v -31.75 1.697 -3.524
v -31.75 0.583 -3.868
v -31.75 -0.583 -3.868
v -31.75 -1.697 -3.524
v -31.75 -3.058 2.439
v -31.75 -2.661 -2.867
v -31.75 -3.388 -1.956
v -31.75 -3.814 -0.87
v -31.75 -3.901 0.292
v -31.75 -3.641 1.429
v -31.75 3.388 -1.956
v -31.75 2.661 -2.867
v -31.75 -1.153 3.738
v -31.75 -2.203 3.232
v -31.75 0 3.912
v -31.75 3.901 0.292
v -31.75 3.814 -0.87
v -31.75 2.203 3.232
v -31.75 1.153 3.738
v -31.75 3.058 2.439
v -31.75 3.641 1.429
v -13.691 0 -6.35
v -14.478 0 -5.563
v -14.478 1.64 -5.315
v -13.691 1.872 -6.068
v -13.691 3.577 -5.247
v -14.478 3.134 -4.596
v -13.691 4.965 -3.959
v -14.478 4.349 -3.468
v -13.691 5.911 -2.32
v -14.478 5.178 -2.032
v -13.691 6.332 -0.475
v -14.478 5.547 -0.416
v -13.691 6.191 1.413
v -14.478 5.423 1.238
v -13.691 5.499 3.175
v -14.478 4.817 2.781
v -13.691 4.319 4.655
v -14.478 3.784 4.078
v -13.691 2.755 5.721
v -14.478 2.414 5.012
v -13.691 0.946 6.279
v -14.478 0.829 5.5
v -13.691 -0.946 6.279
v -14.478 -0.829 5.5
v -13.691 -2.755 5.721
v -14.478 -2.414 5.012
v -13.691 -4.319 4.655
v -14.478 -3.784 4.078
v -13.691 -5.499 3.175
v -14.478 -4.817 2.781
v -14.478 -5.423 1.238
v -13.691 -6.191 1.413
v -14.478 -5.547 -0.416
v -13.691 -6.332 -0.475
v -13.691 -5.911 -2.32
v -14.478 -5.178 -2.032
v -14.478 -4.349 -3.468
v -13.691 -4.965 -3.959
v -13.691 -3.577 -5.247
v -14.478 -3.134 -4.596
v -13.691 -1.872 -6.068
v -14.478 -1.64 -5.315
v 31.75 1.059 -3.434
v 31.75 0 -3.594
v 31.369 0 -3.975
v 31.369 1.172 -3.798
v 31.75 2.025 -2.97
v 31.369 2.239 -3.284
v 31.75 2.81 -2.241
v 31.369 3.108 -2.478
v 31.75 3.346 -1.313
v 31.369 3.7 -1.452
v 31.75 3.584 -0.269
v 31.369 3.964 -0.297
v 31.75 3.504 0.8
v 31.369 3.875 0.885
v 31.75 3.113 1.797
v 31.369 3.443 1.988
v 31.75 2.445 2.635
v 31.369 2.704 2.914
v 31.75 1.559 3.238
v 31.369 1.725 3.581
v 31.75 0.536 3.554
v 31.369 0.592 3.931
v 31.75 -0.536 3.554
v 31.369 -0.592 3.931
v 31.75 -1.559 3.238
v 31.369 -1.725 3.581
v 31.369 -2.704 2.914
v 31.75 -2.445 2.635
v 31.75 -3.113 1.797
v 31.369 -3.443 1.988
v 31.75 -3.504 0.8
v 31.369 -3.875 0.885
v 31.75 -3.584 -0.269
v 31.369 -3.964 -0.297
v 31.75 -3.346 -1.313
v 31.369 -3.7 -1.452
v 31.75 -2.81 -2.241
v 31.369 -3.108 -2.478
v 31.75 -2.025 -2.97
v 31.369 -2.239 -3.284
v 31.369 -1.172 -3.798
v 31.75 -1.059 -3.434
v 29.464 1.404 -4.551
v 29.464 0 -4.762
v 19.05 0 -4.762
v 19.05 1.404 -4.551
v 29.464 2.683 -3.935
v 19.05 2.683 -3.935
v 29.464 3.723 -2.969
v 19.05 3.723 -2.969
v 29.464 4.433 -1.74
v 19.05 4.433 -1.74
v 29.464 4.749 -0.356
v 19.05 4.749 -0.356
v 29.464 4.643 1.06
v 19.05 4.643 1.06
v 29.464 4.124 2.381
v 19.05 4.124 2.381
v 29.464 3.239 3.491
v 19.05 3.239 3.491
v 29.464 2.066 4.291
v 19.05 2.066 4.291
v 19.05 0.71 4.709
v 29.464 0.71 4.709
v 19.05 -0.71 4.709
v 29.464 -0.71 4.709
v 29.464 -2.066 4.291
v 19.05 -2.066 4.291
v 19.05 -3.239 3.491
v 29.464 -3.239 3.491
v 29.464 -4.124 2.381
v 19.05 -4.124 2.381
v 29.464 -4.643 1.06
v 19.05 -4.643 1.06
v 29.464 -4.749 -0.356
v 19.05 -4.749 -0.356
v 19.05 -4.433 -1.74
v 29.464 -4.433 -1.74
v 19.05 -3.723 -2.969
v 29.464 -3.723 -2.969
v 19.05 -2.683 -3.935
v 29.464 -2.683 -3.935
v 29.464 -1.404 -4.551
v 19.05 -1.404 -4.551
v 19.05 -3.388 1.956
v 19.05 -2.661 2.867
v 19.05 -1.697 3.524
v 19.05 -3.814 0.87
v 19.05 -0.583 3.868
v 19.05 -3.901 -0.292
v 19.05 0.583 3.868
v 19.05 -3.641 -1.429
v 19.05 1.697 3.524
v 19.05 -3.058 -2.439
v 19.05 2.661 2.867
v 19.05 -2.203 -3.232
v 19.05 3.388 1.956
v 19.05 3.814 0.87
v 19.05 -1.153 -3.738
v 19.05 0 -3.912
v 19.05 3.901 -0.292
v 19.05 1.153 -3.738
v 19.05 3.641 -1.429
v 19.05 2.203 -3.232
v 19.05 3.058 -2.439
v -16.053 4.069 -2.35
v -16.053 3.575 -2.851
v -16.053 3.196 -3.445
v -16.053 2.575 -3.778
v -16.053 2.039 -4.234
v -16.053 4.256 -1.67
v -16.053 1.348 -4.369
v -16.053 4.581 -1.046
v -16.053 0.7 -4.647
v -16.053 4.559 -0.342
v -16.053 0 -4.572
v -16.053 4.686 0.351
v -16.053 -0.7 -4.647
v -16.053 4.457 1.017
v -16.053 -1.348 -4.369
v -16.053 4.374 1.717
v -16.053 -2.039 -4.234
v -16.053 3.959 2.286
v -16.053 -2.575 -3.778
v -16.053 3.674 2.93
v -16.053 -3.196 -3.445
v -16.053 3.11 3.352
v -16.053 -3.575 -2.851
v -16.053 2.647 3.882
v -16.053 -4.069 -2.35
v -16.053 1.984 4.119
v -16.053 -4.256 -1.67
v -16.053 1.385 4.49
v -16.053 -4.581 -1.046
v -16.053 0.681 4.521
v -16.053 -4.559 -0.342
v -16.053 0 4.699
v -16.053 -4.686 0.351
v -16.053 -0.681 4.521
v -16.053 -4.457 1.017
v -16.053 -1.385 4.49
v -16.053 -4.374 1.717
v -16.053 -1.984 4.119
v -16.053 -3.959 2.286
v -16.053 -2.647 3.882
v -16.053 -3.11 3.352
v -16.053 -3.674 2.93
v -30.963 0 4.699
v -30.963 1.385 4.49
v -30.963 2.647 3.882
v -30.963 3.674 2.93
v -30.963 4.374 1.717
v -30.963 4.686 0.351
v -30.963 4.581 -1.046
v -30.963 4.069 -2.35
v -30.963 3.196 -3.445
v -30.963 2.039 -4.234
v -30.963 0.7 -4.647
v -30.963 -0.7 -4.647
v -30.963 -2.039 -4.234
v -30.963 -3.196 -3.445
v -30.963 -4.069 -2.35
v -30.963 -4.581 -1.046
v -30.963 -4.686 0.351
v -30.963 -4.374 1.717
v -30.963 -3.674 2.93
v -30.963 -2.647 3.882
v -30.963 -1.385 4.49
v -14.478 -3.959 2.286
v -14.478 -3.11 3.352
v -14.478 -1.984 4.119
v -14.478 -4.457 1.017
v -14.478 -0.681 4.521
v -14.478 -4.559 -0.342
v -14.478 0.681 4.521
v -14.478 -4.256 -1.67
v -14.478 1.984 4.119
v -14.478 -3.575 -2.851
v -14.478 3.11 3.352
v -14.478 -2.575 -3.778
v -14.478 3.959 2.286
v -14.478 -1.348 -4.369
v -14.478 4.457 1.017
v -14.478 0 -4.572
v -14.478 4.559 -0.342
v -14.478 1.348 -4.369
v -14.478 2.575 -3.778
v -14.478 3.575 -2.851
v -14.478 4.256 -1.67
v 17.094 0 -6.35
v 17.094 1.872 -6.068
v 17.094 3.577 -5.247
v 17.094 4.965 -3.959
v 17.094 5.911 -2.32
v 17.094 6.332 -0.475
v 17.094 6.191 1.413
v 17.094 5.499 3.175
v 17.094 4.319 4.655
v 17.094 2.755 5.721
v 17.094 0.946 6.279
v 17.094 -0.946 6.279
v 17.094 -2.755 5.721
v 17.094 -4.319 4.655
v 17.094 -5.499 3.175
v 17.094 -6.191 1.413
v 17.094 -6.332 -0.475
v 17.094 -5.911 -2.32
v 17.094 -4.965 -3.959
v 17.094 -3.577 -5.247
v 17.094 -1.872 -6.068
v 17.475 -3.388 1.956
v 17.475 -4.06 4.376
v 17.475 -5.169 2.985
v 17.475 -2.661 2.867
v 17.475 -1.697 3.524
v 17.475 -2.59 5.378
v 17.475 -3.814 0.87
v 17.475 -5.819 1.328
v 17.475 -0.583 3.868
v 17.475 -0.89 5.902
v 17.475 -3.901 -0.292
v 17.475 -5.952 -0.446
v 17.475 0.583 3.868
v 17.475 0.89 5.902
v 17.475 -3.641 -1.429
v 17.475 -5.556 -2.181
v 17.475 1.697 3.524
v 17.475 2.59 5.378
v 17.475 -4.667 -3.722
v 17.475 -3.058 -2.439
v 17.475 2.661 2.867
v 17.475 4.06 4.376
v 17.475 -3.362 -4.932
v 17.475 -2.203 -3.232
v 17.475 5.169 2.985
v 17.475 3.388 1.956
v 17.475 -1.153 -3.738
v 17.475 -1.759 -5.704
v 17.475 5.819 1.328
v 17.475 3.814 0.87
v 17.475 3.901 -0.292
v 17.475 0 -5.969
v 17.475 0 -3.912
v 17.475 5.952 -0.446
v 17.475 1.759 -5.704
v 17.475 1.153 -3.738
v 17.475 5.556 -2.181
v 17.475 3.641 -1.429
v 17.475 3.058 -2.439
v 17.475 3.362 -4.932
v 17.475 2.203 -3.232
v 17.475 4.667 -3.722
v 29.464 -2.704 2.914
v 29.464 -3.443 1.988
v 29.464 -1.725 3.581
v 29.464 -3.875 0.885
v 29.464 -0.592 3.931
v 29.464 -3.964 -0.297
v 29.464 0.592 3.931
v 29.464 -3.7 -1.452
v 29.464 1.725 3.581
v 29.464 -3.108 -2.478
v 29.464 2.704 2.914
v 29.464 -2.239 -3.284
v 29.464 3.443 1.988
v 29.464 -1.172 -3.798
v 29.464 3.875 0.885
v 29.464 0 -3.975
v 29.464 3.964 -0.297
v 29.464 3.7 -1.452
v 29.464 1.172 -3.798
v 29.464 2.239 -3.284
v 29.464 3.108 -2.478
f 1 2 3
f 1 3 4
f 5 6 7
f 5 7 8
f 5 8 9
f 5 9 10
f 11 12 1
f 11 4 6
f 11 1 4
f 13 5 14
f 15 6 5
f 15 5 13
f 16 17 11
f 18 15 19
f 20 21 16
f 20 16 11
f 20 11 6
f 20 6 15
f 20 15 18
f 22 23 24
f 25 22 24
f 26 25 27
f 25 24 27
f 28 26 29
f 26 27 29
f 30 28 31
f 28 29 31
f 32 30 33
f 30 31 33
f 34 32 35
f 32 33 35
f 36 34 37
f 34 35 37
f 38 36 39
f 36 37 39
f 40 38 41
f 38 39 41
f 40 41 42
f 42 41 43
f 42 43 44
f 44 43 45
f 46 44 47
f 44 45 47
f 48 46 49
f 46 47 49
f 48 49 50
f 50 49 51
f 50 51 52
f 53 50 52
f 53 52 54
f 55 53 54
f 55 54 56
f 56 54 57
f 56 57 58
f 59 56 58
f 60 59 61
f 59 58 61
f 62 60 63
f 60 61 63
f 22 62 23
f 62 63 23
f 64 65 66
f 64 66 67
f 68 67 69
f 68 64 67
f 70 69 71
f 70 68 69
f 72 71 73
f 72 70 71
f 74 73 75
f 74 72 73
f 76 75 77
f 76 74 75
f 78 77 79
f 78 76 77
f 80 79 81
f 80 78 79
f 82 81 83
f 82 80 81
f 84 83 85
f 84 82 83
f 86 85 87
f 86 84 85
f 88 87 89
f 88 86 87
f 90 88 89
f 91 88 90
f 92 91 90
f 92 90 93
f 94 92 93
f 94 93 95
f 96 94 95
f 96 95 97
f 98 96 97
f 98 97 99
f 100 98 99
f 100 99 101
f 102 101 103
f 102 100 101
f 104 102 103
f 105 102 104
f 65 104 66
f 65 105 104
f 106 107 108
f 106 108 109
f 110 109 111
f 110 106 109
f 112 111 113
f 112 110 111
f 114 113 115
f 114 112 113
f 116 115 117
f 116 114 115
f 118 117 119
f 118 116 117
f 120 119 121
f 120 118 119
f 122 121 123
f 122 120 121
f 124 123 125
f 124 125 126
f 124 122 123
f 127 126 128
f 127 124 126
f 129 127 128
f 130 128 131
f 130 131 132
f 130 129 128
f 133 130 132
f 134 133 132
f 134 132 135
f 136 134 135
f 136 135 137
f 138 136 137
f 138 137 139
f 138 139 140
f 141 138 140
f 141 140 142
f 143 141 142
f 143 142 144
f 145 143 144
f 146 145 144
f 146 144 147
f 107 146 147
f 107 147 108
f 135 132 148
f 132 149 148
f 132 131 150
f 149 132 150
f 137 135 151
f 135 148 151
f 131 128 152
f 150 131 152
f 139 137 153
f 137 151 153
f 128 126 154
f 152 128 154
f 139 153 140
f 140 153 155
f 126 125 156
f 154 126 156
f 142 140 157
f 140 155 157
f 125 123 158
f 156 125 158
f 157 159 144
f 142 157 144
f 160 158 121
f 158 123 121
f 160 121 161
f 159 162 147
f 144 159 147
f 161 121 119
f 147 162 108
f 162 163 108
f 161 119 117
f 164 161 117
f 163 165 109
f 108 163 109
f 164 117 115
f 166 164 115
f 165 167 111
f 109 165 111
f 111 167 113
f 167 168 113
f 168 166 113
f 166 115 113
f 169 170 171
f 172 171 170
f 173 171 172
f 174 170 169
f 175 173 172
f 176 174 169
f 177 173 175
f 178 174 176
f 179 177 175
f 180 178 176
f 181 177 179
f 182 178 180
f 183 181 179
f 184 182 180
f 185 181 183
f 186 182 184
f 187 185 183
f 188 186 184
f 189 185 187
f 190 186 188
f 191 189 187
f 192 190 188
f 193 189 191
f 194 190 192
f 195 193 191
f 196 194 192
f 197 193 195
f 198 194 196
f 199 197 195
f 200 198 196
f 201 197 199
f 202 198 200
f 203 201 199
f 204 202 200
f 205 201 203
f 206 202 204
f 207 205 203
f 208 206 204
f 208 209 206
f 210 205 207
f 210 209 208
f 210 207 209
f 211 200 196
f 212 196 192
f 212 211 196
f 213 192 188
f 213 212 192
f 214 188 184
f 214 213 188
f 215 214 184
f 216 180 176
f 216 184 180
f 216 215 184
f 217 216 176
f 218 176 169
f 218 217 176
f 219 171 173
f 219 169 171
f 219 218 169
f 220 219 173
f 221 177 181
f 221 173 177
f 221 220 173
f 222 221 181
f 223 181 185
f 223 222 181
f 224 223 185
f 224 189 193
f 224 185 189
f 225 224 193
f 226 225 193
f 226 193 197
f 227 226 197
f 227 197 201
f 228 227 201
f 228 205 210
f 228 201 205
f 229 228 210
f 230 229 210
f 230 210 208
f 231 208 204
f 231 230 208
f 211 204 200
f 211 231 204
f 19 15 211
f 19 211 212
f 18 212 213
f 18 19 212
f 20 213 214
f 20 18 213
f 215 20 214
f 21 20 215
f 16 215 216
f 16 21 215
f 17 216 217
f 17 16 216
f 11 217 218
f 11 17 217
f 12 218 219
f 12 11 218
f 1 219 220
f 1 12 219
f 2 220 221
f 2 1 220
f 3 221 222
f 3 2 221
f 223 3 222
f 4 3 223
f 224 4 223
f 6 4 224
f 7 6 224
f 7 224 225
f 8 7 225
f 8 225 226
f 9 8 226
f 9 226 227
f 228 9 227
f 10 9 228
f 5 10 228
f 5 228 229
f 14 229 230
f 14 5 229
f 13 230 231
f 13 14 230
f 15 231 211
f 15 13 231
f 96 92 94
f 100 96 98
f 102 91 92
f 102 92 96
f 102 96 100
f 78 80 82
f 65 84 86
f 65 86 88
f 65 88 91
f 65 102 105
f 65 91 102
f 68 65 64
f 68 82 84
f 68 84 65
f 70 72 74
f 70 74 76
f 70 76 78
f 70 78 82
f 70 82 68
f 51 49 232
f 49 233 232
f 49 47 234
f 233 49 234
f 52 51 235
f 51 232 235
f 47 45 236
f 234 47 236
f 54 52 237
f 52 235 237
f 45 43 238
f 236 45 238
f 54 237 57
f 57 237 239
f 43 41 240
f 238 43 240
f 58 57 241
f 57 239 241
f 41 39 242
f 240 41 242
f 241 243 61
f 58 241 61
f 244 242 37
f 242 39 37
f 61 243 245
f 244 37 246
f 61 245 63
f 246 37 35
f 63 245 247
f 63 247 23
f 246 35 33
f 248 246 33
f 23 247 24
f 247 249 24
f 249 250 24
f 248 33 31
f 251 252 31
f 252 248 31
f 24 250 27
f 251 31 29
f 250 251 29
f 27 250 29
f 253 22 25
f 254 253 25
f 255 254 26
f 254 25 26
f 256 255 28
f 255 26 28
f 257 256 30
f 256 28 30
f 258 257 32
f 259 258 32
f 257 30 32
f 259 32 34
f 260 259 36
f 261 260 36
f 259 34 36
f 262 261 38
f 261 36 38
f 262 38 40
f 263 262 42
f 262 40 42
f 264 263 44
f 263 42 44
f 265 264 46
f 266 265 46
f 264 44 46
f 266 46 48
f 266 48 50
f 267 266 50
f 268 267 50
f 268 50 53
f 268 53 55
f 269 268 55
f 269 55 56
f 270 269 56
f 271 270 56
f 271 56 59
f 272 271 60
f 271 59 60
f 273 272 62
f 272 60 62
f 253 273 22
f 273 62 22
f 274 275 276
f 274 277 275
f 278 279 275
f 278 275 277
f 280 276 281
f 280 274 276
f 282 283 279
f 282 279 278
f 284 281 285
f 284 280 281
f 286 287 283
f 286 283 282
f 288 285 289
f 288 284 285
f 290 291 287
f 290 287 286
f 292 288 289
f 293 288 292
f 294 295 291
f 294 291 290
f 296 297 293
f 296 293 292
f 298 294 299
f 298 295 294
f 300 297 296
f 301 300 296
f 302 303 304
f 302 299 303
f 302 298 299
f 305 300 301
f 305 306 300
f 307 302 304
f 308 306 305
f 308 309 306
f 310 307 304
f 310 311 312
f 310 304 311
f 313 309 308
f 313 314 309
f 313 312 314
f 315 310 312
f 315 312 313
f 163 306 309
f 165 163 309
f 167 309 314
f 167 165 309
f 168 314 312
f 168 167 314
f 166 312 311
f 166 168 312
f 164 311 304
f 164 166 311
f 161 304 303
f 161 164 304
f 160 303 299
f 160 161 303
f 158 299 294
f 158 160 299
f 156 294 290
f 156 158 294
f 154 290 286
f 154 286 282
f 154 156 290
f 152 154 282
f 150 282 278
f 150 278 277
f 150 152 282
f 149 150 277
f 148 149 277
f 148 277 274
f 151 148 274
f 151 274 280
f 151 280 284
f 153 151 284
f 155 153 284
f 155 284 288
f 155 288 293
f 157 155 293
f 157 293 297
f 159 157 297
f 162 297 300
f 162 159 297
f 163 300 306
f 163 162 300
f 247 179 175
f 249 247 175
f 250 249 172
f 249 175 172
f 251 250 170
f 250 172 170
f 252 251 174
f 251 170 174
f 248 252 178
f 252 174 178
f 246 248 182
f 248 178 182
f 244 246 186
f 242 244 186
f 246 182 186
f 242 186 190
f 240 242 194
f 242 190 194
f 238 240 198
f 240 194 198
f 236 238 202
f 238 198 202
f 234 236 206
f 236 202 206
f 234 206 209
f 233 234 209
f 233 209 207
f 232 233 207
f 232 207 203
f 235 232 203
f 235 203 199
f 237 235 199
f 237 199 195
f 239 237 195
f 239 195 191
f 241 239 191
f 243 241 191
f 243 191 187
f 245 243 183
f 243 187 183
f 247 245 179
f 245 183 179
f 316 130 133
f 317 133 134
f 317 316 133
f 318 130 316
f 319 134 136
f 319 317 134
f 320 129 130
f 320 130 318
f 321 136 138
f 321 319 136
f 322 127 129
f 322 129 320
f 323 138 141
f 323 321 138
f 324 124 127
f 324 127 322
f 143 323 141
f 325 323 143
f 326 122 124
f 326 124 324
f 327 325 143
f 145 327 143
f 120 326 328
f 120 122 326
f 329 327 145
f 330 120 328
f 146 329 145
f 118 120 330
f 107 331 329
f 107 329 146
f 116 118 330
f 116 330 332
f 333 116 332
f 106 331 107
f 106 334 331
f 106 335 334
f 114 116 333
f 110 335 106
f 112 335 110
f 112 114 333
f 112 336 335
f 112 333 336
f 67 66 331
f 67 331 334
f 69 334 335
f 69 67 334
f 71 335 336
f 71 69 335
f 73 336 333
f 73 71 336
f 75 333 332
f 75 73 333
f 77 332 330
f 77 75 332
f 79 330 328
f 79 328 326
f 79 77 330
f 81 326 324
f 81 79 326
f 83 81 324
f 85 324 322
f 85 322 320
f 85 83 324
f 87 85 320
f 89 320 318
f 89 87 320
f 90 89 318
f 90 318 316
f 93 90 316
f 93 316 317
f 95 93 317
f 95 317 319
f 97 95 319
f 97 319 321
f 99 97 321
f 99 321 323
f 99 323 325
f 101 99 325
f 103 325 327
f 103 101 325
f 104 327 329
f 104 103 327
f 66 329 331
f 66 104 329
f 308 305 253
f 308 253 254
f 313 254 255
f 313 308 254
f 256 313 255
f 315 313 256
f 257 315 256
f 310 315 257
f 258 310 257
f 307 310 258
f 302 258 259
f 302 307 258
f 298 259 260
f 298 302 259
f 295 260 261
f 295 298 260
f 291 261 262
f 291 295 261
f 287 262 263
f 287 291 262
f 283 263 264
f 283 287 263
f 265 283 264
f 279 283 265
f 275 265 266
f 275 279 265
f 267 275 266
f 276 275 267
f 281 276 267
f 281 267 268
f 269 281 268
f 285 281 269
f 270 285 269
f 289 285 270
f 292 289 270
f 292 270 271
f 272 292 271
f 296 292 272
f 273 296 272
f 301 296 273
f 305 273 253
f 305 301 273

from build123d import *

# Parameters (mm, degrees)
SKETCH1_R           = 3.9116
BOSS_EXTRUDE1_DEPTH = 31.75
SKETCH2_R           = 4.699
BOSS_EXTRUDE2_DEPTH = 17.272
CUT_EXTRUDE1_START  = -1.5748
SKETCH3_R           = 4.699
SKETCH3_R_2         = 4.572
CUT_EXTRUDE1_DEPTH  = 1.5748
SKETCH6_R           = 4.7625
BOSS_EXTRUDE4_DEPTH = 12.7
SKETCH7_R           = 4.7625
SKETCH7_R_2         = 3.9751
CUT_EXTRUDE2_DEPTH  = 2.286
SKETCH8_R           = 6.35
BOSS_EXTRUDE5_DEPTH = 31.9532
CHAMFER1_SIZE       = 0.7874
CHAMFER2_SIZE       = 0.381


with BuildPart() as part:
    # Sketch1 → Boss-Extrude1 (new, symmetric)
    with BuildSketch(Plane(origin=(0, 0, 0), x_dir=(0, 0, -1), z_dir=(1, 0, 0))):
        Circle(SKETCH1_R)
    extrude(amount=BOSS_EXTRUDE1_DEPTH, both=True)

    # Sketch2 → Boss-Extrude2 (add)
    with BuildSketch(Plane.ZY.offset(31.75)):
        Circle(SKETCH2_R)
    extrude(amount=-BOSS_EXTRUDE2_DEPTH)

    # Sketch3 → Cut-Extrude1 (cut)
    with BuildSketch(Plane(origin=(-14.478, 0, 0), x_dir=(0, 0, -1), z_dir=(1, 0, 0)).offset(CUT_EXTRUDE1_START)):
        with Locations(Location((0, 0, 0), (0, 0, 180))):
            Circle(SKETCH3_R)
        Circle(SKETCH3_R_2, mode=Mode.SUBTRACT)
    extrude(amount=CUT_EXTRUDE1_DEPTH, mode=Mode.SUBTRACT)

    # Sketch6 → Boss-Extrude4 (add)
    with BuildSketch(Plane(origin=(31.75, 0, 0), x_dir=(0, 0, -1), z_dir=(1, 0, 0))):
        Circle(SKETCH6_R)
    extrude(amount=-BOSS_EXTRUDE4_DEPTH)

    # Sketch7 → Cut-Extrude2 (cut)
    with BuildSketch(Plane(origin=(31.75, 0, 0), x_dir=(0, 0, -1), z_dir=(1, 0, 0))):
        Circle(SKETCH7_R)
        Circle(SKETCH7_R_2, mode=Mode.SUBTRACT)
    extrude(amount=-CUT_EXTRUDE2_DEPTH, mode=Mode.SUBTRACT)

    # Sketch8 → Boss-Extrude5 (add)
    with BuildSketch(Plane(origin=(-14.478, 0, 0), x_dir=(0, 0, -1), z_dir=(1, 0, 0))):
        Circle(SKETCH8_R)
    extrude(amount=BOSS_EXTRUDE5_DEPTH)

    # Chamfer1
    chamfer1_edges = [part.edges().sort_by_distance(p)[0] for p in [
        (-14.478, 0, 6.35),
        (-31.75, 0, -4.699),
    ]]
    chamfer(chamfer1_edges, length=CHAMFER1_SIZE)

    # Chamfer2
    chamfer2_edges = [part.edges().sort_by_distance(p)[0] for p in [
        (31.75, 0, 3.9751),
        (17.4752, 0, 6.35),
    ]]
    chamfer(chamfer2_edges, length=CHAMFER2_SIZE)


solid = part.part
